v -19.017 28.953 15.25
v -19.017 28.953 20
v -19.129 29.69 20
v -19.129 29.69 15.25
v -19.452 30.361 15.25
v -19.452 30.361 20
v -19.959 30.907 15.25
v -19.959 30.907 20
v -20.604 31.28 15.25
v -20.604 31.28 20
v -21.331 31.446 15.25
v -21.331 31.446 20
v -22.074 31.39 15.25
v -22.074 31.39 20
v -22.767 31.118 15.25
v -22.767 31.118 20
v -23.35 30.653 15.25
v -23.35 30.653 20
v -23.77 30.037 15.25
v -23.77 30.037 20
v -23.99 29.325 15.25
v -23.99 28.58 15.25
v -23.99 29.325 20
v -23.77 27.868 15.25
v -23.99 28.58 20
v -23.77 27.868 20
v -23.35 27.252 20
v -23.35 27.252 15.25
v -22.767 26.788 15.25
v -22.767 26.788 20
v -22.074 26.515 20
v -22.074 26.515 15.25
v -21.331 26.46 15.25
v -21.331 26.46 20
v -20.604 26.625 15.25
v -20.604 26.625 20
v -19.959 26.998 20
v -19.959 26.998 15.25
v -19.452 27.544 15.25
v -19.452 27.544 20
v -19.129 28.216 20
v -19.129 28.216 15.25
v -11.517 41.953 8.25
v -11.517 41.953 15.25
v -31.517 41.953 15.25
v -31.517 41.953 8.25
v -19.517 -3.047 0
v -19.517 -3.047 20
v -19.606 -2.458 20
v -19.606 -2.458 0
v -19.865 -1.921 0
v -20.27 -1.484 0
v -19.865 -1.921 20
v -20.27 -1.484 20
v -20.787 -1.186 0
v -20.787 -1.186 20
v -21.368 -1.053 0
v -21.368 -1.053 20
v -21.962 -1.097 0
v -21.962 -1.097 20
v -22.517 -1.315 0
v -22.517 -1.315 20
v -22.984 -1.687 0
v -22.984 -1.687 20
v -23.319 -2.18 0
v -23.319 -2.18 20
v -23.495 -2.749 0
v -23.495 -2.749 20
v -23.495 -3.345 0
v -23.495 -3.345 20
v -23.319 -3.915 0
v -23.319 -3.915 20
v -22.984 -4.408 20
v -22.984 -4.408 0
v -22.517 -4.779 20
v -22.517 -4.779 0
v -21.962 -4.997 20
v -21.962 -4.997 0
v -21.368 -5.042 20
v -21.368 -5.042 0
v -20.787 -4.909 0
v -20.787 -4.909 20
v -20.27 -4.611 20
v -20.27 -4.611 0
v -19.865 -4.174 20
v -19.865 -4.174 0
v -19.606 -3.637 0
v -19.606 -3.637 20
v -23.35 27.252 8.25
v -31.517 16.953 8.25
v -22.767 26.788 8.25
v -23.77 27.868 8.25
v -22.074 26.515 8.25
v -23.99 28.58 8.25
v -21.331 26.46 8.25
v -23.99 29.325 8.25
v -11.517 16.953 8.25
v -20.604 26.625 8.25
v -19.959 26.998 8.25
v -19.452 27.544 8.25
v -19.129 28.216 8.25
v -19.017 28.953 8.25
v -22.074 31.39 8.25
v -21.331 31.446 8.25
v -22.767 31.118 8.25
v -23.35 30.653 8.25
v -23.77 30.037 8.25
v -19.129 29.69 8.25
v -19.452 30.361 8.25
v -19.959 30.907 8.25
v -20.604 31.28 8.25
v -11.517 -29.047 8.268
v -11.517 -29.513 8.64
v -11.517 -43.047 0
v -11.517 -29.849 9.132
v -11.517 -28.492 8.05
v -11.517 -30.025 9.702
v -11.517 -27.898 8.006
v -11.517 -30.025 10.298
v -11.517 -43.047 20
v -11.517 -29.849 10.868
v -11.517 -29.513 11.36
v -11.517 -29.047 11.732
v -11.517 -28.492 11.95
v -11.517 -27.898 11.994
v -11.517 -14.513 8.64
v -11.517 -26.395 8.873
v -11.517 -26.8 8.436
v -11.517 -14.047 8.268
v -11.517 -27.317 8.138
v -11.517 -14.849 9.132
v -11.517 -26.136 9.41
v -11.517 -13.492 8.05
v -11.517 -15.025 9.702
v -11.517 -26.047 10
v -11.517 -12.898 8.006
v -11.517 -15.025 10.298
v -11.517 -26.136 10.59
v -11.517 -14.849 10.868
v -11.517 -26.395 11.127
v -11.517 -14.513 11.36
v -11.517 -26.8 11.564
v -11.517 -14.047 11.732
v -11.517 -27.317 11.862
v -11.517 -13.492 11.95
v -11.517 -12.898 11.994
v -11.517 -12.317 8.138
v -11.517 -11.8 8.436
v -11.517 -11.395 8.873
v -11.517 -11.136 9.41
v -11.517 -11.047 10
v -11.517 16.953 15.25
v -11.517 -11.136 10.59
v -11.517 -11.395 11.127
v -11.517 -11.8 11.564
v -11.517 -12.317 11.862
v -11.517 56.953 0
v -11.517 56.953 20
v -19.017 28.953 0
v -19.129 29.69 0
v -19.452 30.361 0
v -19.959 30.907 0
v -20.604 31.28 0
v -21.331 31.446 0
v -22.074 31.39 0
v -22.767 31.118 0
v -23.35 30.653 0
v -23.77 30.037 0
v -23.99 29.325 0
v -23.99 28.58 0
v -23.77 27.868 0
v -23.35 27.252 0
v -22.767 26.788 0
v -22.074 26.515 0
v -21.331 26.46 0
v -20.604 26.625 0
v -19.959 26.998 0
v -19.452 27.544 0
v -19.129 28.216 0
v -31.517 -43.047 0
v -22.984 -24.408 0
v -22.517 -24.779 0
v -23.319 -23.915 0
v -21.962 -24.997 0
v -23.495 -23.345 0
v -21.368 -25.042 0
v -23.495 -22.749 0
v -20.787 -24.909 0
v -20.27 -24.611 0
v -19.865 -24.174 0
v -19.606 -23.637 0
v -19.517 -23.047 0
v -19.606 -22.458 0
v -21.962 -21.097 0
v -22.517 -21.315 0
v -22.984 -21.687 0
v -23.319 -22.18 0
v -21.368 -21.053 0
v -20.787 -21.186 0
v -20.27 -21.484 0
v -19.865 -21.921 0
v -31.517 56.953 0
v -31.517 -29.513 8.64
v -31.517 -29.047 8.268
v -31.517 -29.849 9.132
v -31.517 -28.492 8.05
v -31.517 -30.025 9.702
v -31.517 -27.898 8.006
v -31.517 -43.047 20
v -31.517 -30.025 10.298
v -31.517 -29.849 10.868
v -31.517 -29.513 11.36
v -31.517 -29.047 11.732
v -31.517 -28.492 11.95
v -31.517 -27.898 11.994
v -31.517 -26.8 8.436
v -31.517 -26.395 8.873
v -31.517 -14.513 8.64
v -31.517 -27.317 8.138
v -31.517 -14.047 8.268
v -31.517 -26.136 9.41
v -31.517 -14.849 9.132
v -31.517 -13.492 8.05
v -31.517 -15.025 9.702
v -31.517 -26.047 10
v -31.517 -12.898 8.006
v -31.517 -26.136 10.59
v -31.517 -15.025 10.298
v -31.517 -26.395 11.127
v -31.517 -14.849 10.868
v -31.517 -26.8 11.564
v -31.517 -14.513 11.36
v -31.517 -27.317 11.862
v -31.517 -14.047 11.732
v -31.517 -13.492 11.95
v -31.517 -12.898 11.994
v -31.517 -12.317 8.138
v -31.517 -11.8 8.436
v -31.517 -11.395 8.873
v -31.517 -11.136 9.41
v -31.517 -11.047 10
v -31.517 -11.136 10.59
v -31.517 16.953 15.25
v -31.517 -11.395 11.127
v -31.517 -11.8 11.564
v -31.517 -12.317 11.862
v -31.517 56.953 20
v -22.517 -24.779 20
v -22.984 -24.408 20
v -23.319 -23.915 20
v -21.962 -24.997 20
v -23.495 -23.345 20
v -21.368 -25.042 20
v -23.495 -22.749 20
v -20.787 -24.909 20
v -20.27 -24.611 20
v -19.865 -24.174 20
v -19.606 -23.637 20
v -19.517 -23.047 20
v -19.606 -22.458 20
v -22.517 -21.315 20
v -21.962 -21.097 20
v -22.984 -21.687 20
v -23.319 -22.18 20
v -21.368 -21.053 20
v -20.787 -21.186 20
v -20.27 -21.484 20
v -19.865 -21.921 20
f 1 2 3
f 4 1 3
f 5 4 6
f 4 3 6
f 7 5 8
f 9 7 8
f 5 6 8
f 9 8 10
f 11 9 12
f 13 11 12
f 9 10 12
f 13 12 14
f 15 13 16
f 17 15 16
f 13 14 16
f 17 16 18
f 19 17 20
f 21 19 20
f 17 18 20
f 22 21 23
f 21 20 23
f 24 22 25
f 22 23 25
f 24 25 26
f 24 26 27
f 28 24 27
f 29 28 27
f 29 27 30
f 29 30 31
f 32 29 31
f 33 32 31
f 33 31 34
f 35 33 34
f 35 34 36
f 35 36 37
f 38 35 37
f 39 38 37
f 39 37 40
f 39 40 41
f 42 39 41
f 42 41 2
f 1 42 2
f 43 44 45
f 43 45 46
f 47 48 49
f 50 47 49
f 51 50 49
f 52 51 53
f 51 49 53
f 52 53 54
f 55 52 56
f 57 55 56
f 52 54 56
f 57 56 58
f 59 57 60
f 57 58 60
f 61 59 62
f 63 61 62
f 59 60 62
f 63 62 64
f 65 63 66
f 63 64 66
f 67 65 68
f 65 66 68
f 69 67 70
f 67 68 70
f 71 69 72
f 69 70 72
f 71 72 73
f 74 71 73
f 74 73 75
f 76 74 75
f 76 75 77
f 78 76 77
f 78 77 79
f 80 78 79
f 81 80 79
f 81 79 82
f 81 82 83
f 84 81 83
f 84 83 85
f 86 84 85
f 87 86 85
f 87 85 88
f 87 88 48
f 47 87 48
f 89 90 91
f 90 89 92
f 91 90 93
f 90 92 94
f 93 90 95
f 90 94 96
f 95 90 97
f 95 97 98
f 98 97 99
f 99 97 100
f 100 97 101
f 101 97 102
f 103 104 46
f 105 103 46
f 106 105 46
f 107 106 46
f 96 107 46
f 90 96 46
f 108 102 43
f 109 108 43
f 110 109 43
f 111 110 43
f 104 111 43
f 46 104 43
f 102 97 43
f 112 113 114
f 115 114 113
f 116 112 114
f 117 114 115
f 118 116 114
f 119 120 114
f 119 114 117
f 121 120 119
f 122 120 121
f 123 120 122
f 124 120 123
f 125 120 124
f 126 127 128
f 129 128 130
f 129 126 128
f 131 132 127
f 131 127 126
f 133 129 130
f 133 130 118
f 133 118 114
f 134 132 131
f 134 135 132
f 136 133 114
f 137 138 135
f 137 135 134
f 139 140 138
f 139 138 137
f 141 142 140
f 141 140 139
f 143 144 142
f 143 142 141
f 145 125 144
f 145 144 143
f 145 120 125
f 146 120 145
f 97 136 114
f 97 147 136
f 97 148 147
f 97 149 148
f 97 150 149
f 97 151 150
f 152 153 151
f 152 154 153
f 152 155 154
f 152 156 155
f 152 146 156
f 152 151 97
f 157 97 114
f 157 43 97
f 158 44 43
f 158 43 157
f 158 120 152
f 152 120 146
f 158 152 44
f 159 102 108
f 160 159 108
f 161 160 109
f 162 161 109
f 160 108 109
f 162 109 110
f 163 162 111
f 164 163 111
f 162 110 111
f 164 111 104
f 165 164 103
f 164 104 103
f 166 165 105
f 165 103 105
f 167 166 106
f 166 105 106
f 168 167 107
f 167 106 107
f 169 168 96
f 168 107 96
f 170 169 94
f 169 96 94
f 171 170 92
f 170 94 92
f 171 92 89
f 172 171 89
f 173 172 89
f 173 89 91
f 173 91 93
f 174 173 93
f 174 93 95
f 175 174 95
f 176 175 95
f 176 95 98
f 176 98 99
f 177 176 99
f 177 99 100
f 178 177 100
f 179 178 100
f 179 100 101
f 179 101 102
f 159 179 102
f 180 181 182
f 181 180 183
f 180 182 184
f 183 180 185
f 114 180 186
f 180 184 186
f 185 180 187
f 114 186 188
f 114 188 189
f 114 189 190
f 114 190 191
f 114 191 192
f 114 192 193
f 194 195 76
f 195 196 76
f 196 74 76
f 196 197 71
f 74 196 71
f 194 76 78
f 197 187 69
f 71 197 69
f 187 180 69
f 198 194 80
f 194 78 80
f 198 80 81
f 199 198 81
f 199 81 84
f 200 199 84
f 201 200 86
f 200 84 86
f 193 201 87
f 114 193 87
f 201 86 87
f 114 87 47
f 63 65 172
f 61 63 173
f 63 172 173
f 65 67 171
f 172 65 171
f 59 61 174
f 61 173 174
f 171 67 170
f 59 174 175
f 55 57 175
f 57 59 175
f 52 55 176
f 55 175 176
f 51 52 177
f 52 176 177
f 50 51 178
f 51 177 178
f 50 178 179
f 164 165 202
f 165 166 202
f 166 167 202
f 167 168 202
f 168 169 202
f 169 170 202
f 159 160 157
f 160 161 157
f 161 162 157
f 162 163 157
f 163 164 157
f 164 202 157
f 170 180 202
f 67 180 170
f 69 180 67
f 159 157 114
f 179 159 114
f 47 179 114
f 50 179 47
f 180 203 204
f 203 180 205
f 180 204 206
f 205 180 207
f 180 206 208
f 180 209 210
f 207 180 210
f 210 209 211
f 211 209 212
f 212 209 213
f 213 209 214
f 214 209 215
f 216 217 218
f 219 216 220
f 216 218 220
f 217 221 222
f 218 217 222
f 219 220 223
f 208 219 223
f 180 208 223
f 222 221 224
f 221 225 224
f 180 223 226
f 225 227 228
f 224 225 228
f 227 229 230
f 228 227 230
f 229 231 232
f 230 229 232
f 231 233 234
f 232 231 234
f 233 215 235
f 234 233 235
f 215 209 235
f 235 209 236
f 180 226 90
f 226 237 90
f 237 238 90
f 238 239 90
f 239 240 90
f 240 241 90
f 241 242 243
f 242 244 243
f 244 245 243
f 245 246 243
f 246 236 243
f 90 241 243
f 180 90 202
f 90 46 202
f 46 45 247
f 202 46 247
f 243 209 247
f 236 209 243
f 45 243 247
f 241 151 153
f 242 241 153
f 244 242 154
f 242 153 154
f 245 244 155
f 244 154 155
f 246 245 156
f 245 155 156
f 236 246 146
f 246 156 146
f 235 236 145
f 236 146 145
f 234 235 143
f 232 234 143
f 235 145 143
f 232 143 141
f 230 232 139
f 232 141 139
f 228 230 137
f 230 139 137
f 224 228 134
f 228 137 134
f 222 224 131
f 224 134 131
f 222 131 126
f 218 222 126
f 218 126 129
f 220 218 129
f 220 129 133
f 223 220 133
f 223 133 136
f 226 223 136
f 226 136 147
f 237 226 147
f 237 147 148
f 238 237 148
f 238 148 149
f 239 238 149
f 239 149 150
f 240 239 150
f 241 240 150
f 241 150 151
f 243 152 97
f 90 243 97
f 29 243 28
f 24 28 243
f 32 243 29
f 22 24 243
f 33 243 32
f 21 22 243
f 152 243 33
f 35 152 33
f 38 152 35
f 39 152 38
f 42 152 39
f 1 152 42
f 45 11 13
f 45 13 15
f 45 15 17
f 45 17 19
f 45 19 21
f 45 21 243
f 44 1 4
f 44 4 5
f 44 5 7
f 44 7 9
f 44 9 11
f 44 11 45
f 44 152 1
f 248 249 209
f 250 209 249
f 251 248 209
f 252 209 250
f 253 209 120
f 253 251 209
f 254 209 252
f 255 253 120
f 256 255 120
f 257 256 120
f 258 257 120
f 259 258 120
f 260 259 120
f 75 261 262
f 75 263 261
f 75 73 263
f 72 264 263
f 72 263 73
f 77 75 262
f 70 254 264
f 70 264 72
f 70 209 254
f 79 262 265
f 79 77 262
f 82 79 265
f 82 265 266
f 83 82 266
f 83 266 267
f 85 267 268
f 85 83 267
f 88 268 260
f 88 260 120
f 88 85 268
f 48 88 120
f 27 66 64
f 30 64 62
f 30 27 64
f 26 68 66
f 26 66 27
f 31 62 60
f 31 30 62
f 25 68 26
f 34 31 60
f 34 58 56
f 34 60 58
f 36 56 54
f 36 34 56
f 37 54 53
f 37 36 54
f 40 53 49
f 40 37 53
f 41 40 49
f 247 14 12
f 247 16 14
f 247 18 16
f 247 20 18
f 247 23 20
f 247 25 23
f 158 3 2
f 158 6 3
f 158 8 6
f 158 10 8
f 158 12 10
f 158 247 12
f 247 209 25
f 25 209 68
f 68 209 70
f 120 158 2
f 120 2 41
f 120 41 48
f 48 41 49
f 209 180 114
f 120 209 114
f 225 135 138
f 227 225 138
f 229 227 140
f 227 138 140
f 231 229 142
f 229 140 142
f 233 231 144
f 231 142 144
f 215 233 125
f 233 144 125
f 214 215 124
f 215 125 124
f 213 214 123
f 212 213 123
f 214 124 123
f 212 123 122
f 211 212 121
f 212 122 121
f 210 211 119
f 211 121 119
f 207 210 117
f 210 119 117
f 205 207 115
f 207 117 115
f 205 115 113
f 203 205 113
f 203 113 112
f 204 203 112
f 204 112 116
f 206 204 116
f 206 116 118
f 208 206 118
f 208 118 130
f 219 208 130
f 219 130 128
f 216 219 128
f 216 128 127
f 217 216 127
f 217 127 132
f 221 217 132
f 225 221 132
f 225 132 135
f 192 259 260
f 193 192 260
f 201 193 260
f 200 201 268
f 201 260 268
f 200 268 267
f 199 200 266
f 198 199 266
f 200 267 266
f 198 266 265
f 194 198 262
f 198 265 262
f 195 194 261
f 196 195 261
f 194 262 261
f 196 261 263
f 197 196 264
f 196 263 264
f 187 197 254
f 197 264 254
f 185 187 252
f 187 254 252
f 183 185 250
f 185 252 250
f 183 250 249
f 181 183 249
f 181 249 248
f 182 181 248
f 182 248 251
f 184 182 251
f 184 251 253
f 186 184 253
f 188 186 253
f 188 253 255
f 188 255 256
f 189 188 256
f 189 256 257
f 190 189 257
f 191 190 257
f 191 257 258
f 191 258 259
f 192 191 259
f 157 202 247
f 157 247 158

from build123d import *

# Parameters (mm, degrees)
SKETCH1_W           = 75.9
SKETCH1_H           = 100
BOSS_EXTRUDE1_DEPTH = 20
SKETCH2_R           = 2.5
CUT_EXTRUDE1_DEPTH  = 85.734786653
SKETCH3_W           = 27.95
SKETCH3_H           = 100
CUT_EXTRUDE2_DEPTH  = 85.734786653
SKETCH4_W           = 7
SKETCH4_H           = 25
CUT_EXTRUDE3_DEPTH  = 41
SKETCH5_R           = 2
CUT_EXTRUDE4_DEPTH  = 69.0951966
SKETCH6_R           = 2
CUT_EXTRUDE5_DEPTH  = 64.589352813


with BuildPart() as part:
    # Sketch1 → Boss-Extrude1 (new body)
    with BuildSketch(Plane.XY):
        with Locations((-21.517455621, 6.952662722)):
            Rectangle(SKETCH1_W, SKETCH1_H)
    extrude(amount=BOSS_EXTRUDE1_DEPTH)

    # Sketch2 → Cut-Extrude1 (cut, through all)
    with BuildSketch(Plane.XY.offset(20)):
        with Locations((-21.517455621, 28.952662722)):
            Circle(SKETCH2_R)
    extrude(amount=-CUT_EXTRUDE1_DEPTH, mode=Mode.SUBTRACT)

    # Sketch3 → Cut-Extrude2 (cut, through all)
    with BuildSketch(Plane.XY.offset(20)):
        with Locations((-45.492455621, 6.952662722)):
            Rectangle(SKETCH3_W, SKETCH3_H)
        with Locations((2.457544379, 6.952662722)):
            Rectangle(SKETCH3_W, SKETCH3_H)
    extrude(amount=-CUT_EXTRUDE2_DEPTH, mode=Mode.SUBTRACT)

    # Sketch4 → Cut-Extrude3 (cut)
    with BuildSketch(Plane(origin=(-11.517455621, 0, 0), x_dir=(0, 0, -1), z_dir=(1, 0, 0))):
        with Locations((-11.75, 29.452662722)):
            Rectangle(SKETCH4_W, SKETCH4_H)
    extrude(amount=-CUT_EXTRUDE3_DEPTH, mode=Mode.SUBTRACT)

    # Sketch5 → Cut-Extrude4 (cut, through all)
    with BuildSketch(Plane.XY.offset(20)):
        with Locations((-21.517455621, -3.047337278)):
            Circle(SKETCH5_R)
        with Locations((-21.517455621, -23.047337278)):
            Circle(SKETCH5_R)
    extrude(amount=-CUT_EXTRUDE4_DEPTH, mode=Mode.SUBTRACT)

    # Sketch6 → Cut-Extrude5 (cut, through all)
    with BuildSketch(Plane(origin=(-11.517455621, 0, 0), x_dir=(0, 0, -1), z_dir=(1, 0, 0))):
        with Locations(Location((-10, -13.047337278, 0), (0, 0, 90))):
            Circle(SKETCH6_R)
        with Locations(Location((-10, -28.047337278, 0), (0, 0, 90))):
            Circle(SKETCH6_R)
    extrude(amount=-CUT_EXTRUDE5_DEPTH, mode=Mode.SUBTRACT)


solid = part.part
